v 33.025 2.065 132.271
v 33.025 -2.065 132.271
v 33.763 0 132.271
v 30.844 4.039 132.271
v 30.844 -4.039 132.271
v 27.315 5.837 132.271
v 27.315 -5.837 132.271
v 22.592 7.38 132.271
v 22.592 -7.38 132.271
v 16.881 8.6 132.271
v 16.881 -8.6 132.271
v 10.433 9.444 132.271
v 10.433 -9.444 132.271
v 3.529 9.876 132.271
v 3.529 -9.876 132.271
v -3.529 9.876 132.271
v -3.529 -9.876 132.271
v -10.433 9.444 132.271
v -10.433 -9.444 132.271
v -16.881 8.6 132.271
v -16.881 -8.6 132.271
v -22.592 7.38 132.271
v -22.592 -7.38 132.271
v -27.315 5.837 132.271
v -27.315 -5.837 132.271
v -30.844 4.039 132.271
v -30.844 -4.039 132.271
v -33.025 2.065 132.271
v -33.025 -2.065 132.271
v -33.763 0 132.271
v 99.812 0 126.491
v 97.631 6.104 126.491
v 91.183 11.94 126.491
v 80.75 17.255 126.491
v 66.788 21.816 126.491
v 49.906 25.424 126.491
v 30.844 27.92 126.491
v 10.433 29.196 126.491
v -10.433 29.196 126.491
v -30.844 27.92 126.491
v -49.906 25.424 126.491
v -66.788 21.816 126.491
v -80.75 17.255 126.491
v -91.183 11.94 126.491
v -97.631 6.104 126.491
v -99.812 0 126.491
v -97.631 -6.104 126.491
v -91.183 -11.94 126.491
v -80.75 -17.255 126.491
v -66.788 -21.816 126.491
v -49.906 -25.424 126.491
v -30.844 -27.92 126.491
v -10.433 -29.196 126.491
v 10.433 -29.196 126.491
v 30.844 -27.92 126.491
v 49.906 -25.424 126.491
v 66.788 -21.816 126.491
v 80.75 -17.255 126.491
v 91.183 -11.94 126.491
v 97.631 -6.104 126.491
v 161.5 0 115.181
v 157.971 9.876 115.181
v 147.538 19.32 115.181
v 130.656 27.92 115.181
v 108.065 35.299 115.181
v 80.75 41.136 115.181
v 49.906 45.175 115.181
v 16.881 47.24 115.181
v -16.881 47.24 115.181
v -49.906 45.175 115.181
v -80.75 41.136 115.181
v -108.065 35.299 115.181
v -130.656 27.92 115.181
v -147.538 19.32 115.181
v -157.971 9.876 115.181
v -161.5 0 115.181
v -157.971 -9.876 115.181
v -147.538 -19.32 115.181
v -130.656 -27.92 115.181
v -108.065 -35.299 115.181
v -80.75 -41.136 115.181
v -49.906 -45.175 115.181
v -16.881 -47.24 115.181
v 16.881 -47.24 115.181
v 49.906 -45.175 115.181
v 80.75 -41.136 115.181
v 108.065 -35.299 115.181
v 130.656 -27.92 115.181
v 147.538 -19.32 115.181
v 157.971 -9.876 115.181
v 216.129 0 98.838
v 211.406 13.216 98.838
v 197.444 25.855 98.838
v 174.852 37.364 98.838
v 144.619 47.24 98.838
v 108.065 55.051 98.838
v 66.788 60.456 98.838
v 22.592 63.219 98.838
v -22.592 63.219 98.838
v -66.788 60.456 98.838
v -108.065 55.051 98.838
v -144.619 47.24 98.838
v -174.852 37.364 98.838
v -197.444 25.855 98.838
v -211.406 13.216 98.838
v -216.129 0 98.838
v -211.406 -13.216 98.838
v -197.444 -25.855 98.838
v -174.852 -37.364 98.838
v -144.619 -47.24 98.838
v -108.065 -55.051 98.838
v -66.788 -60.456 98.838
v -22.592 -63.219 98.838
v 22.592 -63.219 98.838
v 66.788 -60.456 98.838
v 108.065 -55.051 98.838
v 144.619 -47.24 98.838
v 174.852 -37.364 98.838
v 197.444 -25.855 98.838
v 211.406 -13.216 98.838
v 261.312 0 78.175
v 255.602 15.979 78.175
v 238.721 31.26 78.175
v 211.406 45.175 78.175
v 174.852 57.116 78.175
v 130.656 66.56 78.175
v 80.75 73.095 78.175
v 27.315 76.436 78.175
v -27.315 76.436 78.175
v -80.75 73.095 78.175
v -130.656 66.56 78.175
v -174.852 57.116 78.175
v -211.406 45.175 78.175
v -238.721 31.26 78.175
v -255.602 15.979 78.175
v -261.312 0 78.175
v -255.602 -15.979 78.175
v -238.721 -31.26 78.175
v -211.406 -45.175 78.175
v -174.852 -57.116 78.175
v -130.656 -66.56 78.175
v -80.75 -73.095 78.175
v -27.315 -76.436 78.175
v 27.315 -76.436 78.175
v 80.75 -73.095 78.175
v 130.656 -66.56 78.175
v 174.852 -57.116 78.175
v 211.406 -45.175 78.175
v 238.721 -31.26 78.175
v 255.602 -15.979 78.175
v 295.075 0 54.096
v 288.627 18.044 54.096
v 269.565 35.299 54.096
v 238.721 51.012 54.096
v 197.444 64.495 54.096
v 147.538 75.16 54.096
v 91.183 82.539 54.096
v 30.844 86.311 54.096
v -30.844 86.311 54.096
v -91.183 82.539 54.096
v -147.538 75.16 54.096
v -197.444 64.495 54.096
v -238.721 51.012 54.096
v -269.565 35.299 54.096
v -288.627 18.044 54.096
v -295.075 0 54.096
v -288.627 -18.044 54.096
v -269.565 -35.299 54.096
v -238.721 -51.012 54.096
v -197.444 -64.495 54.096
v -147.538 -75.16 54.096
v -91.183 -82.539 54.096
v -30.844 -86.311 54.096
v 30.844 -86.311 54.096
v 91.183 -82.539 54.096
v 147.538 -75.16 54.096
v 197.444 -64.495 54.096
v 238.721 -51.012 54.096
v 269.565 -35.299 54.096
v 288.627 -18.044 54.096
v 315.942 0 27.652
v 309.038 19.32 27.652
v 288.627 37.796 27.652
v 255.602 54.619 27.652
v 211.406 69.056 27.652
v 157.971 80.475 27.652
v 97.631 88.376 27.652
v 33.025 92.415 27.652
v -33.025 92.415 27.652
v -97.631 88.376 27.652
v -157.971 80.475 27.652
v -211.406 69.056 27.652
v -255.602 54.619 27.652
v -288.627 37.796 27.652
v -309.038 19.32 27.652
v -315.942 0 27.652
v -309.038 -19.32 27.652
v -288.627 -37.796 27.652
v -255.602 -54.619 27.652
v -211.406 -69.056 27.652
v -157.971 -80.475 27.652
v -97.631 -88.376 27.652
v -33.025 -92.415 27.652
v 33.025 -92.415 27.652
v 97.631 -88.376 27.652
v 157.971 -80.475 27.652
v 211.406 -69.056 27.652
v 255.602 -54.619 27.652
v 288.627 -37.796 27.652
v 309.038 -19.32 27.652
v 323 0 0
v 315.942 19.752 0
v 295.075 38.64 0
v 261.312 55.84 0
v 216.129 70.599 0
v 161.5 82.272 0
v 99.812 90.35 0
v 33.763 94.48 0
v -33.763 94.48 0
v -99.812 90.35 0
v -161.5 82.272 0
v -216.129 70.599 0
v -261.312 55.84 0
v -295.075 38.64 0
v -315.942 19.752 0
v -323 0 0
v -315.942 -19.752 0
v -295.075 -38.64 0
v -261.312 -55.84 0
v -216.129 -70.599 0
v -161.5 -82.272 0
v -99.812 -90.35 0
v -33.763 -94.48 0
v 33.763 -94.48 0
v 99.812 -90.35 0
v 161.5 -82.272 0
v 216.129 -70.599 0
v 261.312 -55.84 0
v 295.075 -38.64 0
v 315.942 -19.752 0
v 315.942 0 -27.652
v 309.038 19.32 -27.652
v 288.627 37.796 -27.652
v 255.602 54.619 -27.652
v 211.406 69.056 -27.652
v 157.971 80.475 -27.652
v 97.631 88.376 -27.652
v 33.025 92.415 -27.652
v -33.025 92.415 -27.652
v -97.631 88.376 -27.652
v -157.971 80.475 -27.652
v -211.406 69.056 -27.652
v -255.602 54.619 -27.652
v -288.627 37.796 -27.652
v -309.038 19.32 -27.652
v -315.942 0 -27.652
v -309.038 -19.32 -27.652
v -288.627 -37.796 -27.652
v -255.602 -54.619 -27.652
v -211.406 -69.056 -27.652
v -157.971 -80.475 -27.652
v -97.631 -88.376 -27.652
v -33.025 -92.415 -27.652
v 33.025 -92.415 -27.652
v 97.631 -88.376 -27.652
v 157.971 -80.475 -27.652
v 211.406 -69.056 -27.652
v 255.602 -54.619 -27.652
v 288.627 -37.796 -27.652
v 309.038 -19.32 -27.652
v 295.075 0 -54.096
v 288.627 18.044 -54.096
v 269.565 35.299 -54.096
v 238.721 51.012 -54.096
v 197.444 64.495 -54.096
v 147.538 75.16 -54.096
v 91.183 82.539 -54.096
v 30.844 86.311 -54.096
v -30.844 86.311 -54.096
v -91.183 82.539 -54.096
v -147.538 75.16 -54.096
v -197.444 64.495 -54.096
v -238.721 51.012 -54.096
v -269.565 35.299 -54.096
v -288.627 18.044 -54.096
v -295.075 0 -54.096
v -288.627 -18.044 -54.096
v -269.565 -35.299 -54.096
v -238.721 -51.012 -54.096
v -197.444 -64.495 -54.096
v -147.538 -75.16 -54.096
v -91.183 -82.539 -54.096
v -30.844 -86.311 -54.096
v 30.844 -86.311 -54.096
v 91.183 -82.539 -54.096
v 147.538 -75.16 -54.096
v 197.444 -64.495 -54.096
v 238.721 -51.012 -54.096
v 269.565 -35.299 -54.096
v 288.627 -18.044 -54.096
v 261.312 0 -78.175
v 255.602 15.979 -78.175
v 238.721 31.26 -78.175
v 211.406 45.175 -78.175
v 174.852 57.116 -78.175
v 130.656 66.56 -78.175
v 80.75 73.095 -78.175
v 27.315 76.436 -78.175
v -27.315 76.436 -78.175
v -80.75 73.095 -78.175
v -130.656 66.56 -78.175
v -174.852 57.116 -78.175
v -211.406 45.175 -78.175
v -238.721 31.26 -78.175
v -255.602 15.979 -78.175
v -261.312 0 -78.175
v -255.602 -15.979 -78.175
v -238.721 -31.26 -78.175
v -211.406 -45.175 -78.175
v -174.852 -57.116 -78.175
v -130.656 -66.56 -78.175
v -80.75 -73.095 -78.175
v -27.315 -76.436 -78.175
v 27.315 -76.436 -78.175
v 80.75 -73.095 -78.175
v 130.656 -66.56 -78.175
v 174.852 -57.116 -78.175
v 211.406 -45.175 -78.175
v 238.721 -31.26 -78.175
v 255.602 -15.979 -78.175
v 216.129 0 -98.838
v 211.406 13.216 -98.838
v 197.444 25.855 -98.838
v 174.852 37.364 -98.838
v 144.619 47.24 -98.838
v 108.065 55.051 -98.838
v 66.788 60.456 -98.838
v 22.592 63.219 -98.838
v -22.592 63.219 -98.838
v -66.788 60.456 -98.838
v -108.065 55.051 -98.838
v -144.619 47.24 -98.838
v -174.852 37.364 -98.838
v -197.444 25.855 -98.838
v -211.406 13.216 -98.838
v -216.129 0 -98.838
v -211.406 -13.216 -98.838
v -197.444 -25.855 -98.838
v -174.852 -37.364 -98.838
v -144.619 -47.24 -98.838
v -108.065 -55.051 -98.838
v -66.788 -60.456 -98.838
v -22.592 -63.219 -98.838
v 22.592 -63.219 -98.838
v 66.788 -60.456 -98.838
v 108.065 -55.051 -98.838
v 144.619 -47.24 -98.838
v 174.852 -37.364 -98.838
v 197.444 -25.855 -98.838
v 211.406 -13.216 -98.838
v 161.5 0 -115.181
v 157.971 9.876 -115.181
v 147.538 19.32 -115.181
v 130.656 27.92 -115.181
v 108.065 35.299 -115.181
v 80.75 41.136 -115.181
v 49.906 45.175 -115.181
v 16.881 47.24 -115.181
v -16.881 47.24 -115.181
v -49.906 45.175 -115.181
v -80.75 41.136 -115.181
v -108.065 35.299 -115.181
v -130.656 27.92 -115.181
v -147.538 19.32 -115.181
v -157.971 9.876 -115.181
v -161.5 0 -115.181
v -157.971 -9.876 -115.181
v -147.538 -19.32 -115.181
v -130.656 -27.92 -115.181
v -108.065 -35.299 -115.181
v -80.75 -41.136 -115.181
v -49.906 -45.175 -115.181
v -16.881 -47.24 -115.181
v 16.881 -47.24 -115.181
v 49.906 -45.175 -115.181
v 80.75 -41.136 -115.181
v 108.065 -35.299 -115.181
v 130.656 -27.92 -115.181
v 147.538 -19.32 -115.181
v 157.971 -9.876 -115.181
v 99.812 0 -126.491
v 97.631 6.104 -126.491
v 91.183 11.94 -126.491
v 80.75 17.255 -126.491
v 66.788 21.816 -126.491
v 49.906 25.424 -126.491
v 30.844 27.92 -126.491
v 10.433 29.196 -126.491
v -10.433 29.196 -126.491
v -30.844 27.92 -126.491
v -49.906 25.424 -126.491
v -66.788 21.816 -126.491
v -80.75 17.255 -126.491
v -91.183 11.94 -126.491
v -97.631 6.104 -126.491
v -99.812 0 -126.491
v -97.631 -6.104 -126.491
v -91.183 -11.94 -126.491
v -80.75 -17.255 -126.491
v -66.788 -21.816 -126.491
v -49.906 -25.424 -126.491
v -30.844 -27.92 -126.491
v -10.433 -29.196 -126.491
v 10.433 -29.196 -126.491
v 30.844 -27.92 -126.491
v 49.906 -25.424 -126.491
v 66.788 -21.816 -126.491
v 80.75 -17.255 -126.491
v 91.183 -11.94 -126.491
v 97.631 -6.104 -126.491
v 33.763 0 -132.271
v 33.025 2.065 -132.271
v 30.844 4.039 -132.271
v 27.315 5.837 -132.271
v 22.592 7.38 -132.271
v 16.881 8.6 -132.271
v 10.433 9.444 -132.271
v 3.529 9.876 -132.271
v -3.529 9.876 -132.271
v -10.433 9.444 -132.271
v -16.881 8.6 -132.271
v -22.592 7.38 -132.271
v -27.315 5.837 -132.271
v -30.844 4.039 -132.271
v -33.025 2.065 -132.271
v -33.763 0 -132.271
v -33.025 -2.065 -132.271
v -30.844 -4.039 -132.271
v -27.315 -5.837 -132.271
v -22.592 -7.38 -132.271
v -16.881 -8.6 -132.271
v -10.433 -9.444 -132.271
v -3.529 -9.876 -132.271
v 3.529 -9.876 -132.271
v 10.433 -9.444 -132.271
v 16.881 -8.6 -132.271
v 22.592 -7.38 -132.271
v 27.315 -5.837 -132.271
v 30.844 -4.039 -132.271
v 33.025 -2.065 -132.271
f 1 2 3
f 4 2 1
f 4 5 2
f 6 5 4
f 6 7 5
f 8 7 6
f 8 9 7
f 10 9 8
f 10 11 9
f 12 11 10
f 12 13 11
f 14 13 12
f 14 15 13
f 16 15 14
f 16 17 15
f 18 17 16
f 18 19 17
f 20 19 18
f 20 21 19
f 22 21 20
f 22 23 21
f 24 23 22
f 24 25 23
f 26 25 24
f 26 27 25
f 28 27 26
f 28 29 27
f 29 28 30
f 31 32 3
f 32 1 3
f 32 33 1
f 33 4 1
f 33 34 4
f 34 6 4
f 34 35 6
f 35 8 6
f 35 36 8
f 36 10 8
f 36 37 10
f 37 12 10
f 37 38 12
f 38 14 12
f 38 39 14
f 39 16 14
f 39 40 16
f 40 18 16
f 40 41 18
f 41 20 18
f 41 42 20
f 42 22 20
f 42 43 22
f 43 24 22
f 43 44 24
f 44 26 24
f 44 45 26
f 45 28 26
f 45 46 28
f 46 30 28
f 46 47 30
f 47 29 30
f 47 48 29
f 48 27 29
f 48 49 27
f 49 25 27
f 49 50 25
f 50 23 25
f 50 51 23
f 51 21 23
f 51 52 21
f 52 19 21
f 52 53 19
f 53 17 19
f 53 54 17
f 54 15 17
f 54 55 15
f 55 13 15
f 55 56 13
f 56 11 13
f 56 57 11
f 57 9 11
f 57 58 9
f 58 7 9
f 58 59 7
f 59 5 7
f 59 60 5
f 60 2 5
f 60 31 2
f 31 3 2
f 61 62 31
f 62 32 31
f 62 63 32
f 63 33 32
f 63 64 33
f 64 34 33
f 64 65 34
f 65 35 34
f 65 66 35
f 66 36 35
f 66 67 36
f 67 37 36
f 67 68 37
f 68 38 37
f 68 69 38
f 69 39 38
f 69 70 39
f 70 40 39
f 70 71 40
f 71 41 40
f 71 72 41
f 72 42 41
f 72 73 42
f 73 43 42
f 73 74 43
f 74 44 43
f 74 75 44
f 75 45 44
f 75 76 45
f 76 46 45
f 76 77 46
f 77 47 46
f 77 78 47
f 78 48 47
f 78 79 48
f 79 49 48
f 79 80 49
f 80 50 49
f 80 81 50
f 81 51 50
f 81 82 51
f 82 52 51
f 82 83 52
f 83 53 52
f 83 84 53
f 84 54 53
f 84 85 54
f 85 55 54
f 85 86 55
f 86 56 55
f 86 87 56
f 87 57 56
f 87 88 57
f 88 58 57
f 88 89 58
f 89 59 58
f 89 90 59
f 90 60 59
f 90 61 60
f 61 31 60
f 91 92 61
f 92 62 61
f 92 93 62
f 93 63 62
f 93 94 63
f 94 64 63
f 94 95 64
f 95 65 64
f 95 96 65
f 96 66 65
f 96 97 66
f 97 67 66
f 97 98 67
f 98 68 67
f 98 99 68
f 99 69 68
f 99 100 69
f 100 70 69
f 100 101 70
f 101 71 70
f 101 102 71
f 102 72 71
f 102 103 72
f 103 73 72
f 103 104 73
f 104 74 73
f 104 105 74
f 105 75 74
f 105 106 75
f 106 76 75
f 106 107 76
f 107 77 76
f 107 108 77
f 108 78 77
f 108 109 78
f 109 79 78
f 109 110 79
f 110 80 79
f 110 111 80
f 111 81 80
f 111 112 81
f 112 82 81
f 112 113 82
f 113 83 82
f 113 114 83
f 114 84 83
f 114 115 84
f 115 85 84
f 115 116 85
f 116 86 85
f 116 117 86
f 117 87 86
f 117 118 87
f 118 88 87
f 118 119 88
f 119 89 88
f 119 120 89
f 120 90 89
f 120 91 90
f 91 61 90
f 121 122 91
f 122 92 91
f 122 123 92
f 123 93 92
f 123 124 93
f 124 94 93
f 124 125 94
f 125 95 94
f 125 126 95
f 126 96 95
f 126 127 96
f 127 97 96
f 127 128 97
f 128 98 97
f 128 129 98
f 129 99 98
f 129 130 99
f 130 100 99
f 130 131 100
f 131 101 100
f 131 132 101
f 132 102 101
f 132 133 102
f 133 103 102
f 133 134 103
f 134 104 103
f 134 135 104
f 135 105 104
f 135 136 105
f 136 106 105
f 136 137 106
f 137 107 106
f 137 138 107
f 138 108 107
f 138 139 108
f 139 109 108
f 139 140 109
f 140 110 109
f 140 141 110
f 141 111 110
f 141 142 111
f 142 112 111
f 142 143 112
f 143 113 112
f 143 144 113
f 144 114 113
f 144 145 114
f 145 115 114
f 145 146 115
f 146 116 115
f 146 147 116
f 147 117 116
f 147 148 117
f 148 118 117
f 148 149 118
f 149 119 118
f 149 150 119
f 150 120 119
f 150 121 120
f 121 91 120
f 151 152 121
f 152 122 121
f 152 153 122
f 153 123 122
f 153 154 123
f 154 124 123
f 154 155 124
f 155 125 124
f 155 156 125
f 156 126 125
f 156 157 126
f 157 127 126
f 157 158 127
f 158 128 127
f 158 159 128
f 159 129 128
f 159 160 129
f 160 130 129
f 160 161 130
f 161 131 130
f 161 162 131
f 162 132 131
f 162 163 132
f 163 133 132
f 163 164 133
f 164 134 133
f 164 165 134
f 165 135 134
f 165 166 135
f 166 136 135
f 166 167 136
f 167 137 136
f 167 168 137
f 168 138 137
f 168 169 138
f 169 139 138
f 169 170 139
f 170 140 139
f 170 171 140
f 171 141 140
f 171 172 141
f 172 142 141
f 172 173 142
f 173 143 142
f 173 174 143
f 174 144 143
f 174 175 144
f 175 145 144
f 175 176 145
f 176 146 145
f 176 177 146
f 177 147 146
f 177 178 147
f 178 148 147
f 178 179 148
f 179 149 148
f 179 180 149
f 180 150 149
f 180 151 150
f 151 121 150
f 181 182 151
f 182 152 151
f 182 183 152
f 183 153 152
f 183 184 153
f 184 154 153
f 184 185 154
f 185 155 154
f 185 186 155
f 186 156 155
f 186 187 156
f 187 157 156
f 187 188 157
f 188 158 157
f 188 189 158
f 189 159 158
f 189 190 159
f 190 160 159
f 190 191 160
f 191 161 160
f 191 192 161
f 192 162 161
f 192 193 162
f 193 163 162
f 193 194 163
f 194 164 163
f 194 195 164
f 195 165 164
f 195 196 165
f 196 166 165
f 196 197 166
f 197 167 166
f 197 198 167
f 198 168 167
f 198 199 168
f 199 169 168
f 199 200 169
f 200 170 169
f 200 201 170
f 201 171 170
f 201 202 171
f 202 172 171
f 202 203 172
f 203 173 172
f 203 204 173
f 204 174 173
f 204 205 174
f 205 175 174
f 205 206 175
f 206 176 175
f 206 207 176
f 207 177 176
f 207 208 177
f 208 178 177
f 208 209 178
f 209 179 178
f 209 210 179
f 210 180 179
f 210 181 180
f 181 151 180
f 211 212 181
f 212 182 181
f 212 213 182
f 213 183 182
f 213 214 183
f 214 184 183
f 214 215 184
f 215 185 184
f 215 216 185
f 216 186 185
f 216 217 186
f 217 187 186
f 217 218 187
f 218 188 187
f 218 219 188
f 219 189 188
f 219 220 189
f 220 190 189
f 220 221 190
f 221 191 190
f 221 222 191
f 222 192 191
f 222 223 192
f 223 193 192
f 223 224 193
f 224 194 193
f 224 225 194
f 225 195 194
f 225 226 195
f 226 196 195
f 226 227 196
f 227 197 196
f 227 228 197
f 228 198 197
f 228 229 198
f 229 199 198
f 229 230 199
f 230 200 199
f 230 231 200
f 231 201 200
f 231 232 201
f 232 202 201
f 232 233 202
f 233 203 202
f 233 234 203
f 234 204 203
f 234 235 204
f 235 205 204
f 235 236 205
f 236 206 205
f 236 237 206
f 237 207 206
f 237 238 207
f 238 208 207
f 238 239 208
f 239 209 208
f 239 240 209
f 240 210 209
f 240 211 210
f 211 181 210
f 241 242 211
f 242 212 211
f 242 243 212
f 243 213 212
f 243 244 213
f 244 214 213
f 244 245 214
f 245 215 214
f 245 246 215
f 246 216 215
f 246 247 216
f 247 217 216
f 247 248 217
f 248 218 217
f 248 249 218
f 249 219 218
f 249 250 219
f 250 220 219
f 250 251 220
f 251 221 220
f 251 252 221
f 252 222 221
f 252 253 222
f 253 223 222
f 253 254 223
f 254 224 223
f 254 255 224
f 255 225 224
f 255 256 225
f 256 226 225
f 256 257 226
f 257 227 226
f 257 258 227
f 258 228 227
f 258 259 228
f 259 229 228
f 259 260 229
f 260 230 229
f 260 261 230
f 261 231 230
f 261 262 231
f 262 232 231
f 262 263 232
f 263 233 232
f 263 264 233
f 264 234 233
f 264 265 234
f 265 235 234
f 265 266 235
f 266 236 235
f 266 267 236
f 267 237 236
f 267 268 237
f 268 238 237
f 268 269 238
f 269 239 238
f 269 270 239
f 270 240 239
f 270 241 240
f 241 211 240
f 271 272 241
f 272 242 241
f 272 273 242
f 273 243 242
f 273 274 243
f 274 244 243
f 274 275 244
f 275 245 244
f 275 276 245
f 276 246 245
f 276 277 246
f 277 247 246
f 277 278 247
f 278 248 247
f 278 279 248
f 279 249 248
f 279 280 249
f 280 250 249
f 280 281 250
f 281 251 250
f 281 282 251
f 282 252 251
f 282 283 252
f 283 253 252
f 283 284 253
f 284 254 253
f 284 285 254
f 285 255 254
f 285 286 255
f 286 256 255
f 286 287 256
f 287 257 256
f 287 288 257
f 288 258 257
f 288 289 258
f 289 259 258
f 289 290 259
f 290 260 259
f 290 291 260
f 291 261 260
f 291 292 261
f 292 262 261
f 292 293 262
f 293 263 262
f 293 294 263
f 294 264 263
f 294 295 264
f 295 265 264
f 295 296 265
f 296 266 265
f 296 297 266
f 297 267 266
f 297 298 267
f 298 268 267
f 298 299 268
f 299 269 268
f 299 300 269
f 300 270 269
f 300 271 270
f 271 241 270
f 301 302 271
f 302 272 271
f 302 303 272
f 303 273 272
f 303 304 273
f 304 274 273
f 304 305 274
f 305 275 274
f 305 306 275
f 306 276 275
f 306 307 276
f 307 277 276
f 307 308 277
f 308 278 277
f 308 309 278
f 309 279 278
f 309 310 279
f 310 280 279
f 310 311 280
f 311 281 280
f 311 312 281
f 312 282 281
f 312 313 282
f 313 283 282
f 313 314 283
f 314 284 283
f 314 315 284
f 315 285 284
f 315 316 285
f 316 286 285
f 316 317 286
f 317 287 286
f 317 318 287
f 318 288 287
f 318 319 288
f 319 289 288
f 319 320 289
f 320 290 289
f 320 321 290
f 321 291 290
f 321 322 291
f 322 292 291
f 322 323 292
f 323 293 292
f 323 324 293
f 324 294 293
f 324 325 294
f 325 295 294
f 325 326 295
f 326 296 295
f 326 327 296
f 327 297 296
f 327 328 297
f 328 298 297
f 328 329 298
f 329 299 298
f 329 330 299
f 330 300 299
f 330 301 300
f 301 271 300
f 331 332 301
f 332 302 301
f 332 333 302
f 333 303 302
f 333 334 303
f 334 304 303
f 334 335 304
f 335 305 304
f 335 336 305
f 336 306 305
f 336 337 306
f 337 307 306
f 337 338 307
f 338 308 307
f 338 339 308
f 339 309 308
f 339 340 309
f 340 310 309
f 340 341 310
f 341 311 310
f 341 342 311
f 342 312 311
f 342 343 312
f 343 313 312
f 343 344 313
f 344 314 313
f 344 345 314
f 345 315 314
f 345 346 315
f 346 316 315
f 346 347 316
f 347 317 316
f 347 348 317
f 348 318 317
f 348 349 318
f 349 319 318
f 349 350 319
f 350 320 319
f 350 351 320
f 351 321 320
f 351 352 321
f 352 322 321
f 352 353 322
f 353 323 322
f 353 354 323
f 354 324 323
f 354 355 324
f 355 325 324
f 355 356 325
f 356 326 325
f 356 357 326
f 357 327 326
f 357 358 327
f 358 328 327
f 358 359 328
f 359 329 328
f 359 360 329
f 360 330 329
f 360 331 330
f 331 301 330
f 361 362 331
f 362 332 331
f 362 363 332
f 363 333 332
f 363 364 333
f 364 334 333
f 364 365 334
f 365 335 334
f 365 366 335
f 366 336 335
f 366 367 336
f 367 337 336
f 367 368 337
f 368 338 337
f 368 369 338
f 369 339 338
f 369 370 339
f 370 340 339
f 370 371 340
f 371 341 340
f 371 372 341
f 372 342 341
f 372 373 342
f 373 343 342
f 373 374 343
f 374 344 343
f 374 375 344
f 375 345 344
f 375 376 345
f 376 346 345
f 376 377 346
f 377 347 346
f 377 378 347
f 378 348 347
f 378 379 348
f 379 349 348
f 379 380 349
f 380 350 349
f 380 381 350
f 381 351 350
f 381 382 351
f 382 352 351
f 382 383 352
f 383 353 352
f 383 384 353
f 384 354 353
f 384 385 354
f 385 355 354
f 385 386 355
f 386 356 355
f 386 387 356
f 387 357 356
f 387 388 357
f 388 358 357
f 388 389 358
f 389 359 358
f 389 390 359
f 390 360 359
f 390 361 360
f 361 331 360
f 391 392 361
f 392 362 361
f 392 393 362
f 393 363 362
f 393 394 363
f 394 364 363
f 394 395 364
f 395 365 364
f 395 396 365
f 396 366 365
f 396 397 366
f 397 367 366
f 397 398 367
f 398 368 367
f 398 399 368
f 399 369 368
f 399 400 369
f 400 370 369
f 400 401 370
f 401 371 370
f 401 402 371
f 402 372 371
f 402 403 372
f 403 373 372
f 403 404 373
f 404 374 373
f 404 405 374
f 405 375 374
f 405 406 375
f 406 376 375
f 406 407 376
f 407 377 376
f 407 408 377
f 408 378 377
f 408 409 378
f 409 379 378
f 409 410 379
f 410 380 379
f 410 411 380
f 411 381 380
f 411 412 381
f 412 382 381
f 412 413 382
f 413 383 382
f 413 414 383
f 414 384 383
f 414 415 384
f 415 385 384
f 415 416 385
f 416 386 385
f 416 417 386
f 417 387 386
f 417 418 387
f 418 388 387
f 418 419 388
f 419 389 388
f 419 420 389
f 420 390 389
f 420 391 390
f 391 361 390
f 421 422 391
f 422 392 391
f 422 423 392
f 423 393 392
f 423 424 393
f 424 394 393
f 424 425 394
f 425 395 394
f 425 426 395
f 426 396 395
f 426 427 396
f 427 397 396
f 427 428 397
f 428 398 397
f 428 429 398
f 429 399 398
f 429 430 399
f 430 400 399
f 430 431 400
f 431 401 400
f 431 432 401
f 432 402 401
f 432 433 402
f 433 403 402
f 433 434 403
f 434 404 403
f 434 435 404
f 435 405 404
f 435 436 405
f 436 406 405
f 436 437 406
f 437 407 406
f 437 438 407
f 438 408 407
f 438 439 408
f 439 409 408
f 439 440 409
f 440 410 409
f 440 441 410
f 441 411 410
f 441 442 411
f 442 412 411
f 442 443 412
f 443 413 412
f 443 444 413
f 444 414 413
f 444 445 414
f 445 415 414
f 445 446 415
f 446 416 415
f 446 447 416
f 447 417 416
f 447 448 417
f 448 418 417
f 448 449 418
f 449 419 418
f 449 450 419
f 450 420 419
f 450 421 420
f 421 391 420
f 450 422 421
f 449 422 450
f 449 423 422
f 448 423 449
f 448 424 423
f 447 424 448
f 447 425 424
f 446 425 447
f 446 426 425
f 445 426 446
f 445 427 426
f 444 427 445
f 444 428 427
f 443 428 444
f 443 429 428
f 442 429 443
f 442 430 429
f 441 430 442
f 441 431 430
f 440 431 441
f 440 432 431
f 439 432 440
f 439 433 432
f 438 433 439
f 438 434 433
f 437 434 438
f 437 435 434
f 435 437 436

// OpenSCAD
// Generated by SolidPython 1.0.1 on 2020-07-29 00:46:52


scale(v = [17, 5, 7]) {
	sphere(r = 19);
}
/***********************************************
*********      SolidPython code:      **********
************************************************
 
# import packages: SolidPython
from solid import *
from solid.utils import *
from itertools import chain, combinations, permutations


class Resize:

    def __init__(self, scad_file):
        self.scad_file = scad_file
        #self.scad_file = import_scad(scad_file)
        # cone/cylinder param:
        self.r1 = 0
        self.r2 = 0
        self.h = 0
        # rectangular prism param:
        self.w = 0
        self.l = 0
        # ellipse param:
        self.r = 0

    # import OpenScad code (file name corresponds to shape)


    # classify shape + parameters
    def assign(self, param1, param2, param3):
        if self.scad_file == 'cone.scad':
            self.r1 = param1
            self.r2 = param2
            self.h = param3
        elif self.scad_file == 'cylinder.scad':
            self.r1 = param1
            self.r2 = param2
            self.h = param3
        elif self.scad_file == 'rectangularPrism.scad':
            self.h = param1
            self.l = param2
            self.w = param3
        else:
            self.r = param1
            self.h = param2

    # resize parameters
    def iterate(self):
        x = range(3, 20, 2)
        i = 1
        if self.scad_file == 'cone.scad':
            tempList = list(permutations(x, 2))
            for temp in tempList:
                param1 = temp[0]
                param2 = temp[1]
                filepath = 'produced_scad_files/' + 'cone' + str(param1) + '_' + str(param2) + '_' + '.scad'
                scad_render_to_file(cylinder(h=param1, r1=param2, r2=0), filepath)

        elif self.scad_file == 'cylinder.scad':
            tempList = list(permutations(x, 3))
            for temp in tempList:
                param1 = temp[0]
                param2 = temp[1]
                filepath = 'produced_scad_files/' + 'cylinder' + str(param1) + '_' + str(param2) + '_' + '.scad'
                scad_render_to_file(cylinder(h=param1, r1=param2, r2=param2), filepath)

        elif self.scad_file == 'rectangularPrism.scad':
            tempList = list(permutations(x, 3))
            for temp in tempList:
                param1 = temp[0]
                param2 = temp[1]
                param3 = temp[2]
                filepath = 'produced_scad_files/' + 'rectangularPrism' + str(param1) + '_' + str(param2) + '_' + str(
                    param3) + '.scad'
                scad_render_to_file(cube(size=(param1, param2, param3)), filepath)

        elif self.scad_file == 'ellipse.scad':
            tempList = list(permutations(x, 4))
            for temp in tempList:
                param1 = temp[0]
                param2 = temp[1]
                param3 = temp[2]
                param4 = temp[3]
                filepath = 'produced_scad_files/' + 'ellipse' + str(param1) + '_' + str(param2) + '_' + str(param3) + '_' + str(param4) + '.scad'
                scad_render_to_file(scale([param1, param2, param3])(sphere(r=param4)), filepath)

    def render_to_scadfile(self):
        scad_render_to_file(scad, 'example.scad') 
 
************************************************/
